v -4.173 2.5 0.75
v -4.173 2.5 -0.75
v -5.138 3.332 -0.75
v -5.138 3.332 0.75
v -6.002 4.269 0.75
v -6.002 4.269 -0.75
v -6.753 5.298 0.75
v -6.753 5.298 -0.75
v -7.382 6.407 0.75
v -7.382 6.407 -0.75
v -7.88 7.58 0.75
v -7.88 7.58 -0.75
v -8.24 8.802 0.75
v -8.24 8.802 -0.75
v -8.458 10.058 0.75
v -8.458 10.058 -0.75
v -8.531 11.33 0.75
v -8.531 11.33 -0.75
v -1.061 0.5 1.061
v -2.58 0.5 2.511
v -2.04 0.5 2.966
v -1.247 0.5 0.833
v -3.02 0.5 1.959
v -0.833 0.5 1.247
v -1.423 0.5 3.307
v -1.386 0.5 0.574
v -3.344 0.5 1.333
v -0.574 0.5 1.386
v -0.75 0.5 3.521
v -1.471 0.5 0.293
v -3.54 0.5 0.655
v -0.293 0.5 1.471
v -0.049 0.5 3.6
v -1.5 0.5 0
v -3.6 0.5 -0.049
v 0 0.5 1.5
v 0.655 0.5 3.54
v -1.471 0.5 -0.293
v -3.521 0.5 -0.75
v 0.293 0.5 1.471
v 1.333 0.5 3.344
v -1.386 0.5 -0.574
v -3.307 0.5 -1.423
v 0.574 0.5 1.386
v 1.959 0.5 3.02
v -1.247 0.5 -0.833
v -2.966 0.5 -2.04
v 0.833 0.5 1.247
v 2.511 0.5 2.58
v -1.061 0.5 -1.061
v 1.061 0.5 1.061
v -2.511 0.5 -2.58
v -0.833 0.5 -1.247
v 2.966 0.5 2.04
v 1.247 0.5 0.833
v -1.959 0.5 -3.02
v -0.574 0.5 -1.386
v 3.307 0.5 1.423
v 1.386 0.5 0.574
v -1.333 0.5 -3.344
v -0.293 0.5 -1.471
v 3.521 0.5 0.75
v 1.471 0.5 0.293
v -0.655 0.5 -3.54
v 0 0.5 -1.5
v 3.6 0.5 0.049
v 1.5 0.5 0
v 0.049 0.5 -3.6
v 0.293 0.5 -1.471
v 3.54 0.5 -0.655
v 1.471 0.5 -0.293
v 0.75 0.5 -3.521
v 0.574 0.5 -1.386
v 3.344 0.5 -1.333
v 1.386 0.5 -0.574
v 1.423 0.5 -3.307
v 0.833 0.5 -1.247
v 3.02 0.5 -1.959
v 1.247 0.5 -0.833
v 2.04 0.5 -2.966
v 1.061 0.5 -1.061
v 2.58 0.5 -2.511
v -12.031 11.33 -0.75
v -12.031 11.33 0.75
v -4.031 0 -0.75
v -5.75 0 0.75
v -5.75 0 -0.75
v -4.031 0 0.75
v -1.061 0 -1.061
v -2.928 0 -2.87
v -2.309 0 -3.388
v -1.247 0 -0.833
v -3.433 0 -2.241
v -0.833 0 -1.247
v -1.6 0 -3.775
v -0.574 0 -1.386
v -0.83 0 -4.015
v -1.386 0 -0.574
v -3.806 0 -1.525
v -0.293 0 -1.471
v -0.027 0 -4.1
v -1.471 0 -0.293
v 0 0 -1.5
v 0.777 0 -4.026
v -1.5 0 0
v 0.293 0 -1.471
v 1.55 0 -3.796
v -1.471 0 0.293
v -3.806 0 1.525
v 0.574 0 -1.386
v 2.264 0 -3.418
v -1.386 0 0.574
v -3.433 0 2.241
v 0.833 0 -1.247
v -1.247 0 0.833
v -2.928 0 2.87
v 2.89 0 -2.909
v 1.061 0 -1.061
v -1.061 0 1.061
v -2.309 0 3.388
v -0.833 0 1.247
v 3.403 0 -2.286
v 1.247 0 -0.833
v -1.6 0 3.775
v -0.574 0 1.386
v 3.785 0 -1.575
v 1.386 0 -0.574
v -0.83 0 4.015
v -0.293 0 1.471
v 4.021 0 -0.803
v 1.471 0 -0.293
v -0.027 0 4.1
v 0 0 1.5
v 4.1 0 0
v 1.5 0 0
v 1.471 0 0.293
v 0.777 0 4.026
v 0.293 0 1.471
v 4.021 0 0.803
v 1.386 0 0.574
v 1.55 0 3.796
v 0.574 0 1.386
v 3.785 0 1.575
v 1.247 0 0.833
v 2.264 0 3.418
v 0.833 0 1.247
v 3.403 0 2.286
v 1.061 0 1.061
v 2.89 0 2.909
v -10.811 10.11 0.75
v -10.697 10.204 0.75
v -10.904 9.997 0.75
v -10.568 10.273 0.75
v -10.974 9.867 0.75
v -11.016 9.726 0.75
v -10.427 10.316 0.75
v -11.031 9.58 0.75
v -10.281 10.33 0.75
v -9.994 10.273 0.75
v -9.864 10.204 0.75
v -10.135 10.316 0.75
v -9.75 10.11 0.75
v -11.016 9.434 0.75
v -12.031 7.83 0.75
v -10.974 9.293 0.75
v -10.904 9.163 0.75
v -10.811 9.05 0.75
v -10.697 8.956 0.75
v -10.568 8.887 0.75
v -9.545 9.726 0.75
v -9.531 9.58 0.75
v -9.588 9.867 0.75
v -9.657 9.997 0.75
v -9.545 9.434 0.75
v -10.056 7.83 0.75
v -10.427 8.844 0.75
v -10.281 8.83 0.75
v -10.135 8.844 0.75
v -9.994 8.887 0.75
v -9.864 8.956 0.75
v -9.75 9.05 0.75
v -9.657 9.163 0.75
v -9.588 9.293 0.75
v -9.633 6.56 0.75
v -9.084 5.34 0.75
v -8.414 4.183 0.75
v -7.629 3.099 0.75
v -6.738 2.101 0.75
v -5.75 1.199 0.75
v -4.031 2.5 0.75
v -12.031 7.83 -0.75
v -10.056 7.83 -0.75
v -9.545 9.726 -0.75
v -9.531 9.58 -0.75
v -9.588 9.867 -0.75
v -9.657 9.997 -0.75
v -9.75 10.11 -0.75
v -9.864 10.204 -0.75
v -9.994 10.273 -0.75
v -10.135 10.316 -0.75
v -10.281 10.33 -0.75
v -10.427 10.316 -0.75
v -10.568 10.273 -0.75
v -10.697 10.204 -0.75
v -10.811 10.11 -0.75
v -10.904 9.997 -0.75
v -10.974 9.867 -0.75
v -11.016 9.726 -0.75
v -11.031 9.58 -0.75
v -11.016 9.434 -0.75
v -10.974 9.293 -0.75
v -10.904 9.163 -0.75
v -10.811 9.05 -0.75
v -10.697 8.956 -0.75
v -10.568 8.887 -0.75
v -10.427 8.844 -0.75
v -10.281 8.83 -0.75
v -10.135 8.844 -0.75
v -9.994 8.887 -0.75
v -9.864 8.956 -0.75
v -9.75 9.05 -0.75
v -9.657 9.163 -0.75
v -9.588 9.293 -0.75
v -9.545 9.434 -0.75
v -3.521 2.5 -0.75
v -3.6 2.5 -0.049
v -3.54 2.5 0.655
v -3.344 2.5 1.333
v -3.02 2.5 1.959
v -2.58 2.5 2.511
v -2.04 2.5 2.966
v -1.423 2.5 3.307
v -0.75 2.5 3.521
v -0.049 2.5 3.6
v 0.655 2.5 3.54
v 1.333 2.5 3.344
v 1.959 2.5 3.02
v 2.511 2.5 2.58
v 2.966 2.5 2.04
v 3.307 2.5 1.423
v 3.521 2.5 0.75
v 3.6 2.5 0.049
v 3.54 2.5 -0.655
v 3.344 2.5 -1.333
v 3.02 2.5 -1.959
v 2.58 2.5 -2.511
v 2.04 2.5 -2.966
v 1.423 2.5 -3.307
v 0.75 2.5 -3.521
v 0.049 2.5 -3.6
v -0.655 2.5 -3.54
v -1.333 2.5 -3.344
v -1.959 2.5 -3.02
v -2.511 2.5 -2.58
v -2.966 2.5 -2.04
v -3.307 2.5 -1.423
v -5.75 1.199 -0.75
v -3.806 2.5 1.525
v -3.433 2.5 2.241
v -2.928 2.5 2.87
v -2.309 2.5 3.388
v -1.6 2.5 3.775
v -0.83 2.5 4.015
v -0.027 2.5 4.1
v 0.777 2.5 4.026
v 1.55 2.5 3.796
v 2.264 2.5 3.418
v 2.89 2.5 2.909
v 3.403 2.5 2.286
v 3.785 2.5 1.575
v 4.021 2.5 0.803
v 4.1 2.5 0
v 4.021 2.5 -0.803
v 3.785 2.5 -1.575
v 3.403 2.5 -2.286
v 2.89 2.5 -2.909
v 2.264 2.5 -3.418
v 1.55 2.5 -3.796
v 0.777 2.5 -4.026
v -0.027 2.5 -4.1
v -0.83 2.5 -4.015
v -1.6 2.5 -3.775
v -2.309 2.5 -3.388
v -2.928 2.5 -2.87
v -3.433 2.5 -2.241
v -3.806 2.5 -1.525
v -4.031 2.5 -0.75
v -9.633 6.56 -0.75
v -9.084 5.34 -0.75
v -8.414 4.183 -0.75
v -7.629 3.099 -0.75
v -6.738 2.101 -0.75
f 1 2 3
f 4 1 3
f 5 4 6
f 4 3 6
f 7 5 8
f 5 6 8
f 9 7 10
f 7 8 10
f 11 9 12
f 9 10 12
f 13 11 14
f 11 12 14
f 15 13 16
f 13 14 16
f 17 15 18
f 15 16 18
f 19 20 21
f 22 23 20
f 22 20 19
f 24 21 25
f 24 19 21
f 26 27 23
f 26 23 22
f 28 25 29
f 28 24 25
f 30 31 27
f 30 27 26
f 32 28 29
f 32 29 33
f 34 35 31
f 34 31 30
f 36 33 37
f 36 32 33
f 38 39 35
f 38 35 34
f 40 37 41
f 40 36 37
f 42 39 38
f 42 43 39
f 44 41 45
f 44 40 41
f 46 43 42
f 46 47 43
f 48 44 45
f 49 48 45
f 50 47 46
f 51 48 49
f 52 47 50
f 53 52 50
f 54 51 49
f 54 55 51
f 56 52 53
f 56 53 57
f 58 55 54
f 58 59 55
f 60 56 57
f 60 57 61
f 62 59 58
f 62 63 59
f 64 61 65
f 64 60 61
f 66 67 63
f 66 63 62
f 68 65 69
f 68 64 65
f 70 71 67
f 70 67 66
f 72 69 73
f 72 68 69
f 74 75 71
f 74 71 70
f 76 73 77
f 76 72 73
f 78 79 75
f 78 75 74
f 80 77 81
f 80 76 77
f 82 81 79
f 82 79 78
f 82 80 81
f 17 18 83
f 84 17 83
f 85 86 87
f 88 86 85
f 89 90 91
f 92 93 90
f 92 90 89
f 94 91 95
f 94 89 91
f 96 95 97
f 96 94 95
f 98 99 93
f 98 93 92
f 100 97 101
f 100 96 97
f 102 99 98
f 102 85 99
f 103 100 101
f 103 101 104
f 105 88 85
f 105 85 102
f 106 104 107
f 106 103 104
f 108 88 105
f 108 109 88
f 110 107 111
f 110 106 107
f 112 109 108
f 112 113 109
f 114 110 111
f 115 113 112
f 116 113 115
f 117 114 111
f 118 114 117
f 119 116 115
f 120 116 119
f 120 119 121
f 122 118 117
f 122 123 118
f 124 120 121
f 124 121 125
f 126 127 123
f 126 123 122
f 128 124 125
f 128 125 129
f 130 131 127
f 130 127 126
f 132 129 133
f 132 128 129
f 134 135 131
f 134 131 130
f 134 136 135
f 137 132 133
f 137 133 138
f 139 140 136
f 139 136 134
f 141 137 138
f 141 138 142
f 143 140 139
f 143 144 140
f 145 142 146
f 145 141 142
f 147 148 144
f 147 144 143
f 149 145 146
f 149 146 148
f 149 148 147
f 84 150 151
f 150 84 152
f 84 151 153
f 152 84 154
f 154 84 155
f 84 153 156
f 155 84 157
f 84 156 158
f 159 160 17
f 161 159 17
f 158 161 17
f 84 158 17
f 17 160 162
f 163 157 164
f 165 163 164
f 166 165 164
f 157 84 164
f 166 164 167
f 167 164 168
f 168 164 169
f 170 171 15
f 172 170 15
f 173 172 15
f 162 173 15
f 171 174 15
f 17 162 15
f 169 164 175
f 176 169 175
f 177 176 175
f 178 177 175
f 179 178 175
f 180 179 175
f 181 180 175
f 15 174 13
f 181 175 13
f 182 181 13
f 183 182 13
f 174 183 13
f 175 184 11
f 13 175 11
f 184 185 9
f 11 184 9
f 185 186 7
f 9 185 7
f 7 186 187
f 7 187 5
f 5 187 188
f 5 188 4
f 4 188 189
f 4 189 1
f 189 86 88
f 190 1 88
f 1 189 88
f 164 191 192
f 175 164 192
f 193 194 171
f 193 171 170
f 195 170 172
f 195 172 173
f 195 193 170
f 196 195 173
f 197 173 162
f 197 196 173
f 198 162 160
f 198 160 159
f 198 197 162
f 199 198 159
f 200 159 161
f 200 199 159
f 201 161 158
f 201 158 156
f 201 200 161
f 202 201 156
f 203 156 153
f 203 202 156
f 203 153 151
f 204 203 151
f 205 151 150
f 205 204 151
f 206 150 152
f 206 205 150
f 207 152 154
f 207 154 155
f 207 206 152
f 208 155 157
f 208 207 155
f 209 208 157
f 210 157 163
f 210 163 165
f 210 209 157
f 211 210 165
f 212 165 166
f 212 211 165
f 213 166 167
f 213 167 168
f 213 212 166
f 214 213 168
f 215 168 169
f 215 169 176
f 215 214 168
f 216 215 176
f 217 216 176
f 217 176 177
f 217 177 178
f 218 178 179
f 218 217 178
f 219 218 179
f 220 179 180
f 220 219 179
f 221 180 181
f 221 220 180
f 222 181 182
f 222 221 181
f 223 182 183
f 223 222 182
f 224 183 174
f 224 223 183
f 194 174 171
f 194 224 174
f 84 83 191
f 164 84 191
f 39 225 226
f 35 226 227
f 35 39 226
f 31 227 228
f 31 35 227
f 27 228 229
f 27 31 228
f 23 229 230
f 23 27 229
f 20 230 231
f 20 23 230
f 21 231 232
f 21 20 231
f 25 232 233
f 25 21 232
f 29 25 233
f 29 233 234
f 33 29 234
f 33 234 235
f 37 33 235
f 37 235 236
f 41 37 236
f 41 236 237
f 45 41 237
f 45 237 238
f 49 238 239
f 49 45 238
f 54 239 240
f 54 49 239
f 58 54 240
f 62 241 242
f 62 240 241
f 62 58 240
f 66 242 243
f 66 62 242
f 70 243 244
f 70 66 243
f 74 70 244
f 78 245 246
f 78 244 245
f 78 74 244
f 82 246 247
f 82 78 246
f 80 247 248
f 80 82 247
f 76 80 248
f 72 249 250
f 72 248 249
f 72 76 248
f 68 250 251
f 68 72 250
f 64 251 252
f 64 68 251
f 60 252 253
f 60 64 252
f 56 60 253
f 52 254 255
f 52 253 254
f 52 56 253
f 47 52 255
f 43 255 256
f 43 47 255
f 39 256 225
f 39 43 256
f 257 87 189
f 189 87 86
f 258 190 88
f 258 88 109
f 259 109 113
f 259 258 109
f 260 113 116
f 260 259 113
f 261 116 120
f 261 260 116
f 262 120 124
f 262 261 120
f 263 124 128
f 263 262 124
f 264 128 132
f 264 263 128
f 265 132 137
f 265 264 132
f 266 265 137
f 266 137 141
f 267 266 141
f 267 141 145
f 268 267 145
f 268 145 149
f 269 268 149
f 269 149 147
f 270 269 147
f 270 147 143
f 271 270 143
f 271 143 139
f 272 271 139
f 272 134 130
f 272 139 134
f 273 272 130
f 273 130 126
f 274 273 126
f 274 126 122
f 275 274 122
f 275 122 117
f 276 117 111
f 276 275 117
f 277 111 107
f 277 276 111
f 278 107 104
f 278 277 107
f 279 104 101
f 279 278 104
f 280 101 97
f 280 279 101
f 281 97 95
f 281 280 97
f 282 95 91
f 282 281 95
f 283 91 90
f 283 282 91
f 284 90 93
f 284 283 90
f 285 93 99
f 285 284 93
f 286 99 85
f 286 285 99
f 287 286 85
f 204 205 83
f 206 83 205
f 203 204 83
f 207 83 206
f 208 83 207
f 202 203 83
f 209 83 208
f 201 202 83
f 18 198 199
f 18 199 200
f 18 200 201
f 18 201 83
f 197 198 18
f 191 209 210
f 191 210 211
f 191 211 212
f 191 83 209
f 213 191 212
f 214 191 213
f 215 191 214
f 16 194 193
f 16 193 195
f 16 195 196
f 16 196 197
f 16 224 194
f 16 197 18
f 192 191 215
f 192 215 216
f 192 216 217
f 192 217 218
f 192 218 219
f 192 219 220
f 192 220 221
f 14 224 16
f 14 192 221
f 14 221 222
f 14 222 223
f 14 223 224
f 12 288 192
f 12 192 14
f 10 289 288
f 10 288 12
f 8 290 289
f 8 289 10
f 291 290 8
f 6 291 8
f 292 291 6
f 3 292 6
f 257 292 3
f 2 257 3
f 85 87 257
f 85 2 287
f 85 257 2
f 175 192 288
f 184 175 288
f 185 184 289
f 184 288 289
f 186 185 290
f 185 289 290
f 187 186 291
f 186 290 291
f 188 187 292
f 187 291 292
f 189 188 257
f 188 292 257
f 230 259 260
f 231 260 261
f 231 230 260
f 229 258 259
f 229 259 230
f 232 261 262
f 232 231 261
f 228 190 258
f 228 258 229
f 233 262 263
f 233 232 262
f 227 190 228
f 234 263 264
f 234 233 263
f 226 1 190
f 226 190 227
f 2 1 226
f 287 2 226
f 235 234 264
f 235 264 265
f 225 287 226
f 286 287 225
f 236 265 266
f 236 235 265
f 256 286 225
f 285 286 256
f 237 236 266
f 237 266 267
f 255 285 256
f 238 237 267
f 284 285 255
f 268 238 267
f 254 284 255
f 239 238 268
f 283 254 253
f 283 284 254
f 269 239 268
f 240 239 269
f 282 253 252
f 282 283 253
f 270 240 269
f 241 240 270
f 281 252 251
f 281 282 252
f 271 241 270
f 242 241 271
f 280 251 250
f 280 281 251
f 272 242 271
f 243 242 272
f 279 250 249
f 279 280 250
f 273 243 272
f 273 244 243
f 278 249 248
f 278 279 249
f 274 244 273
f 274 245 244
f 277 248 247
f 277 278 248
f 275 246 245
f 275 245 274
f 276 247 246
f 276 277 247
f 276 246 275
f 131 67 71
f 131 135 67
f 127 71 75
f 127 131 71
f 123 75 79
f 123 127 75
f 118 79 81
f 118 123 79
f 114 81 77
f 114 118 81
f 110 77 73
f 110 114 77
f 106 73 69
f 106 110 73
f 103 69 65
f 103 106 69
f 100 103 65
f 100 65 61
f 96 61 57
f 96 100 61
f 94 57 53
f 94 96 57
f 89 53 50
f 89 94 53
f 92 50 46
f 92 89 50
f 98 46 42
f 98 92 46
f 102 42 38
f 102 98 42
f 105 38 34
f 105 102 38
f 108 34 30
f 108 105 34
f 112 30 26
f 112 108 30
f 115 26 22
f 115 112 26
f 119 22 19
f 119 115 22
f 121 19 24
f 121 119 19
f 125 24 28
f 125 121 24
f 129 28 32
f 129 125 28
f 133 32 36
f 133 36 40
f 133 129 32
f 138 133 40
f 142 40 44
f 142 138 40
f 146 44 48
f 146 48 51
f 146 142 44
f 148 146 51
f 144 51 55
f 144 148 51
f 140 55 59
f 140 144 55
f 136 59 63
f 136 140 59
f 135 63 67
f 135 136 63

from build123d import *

# Parameters (mm, degrees)
SKETCH4_R           = 0.75
BOSS_EXTRUDE1_DEPTH = 1.5
BOSS_EXTRUDE2_REACH = 19.027
SKETCH3_W           = 2.850862197
SKETCH3_H           = 1.5
CUT_EXTRUDE1_START  = -2
SKETCH5_R           = 3.6
CUT_EXTRUDE1_DEPTH  = 2


with BuildPart() as part:
    # Sketch1 → Revolve1 (revolve)
    with BuildSketch(Plane.XY):
        Polygon((4.1, 0), (4.1, 2.5), (3.6, 2.5), (3.6, 0.5), (1.5, 0.5), (1.5, 0), align=None)
    revolve(axis=Axis((0, 0, 0), (0, 1, 0)))

    # Boss-Extrude2: up to this face of the body (flat: up to its plane)
    boss_extrude2_end = Plane(part.part.faces().sort_by_distance((-3.984034488, 2.5, 0))[0])
    # Sketch3 → Boss-Extrude2 (add, up to the picked face)
    with BuildSketch(Plane.XZ, mode=Mode.PRIVATE) as boss_extrude2_sk1:
        with Locations((-4.324568902, 0)):
            Rectangle(SKETCH3_W, SKETCH3_H)
    boss_extrude2_tool1 = split(extrude(boss_extrude2_sk1.sketch, amount=-BOSS_EXTRUDE2_REACH, mode=Mode.PRIVATE), bisect_by=boss_extrude2_end, keep=Keep.BOTH, mode=Mode.PRIVATE)


with BuildPart() as body_2:
    # Sketch4 → Boss-Extrude1 (new body)
    with BuildSketch(Plane.XY.offset(-0.75)):
        with BuildLine():
            Line((-8.530818775, 11.33), (-12.030818775, 11.33))
            Line((-12.030818775, 11.33), (-12.030818775, 7.83))
            Line((-12.030818775, 7.83), (-10.055529403, 7.83))
            ThreePointArc((-10.055529403, 7.83), (-7.808057008, 3.326468933), (-4.030818775, 0))
            Line((-4.030818775, 0), (-4.172844356, 2.5))
            ThreePointArc((-4.172844356, 2.5), (-7.382007257, 6.406565197), (-8.530818775, 11.33))
        make_face()
        with Locations((-10.280818775, 9.58)):
            Circle(SKETCH4_R, mode=Mode.SUBTRACT)
    extrude(amount=BOSS_EXTRUDE1_DEPTH)


with BuildPart() as part_1:
    add(part.part)

    add(body_2.part)  # Boss-Extrude2 merges body 2
    add(boss_extrude2_tool1.solids().sort_by(Axis((-4.324569, 0, 0), (0, 1, 0)))[0])

    # Sketch5 → Cut-Extrude1 (cut)
    with BuildSketch(Plane(origin=(0, 2.5, 0), x_dir=(1, 0, 0), z_dir=(0, 1, 0)).offset(CUT_EXTRUDE1_START)):
        Circle(SKETCH5_R)
    extrude(amount=CUT_EXTRUDE1_DEPTH, mode=Mode.SUBTRACT)


solid = part_1.part
